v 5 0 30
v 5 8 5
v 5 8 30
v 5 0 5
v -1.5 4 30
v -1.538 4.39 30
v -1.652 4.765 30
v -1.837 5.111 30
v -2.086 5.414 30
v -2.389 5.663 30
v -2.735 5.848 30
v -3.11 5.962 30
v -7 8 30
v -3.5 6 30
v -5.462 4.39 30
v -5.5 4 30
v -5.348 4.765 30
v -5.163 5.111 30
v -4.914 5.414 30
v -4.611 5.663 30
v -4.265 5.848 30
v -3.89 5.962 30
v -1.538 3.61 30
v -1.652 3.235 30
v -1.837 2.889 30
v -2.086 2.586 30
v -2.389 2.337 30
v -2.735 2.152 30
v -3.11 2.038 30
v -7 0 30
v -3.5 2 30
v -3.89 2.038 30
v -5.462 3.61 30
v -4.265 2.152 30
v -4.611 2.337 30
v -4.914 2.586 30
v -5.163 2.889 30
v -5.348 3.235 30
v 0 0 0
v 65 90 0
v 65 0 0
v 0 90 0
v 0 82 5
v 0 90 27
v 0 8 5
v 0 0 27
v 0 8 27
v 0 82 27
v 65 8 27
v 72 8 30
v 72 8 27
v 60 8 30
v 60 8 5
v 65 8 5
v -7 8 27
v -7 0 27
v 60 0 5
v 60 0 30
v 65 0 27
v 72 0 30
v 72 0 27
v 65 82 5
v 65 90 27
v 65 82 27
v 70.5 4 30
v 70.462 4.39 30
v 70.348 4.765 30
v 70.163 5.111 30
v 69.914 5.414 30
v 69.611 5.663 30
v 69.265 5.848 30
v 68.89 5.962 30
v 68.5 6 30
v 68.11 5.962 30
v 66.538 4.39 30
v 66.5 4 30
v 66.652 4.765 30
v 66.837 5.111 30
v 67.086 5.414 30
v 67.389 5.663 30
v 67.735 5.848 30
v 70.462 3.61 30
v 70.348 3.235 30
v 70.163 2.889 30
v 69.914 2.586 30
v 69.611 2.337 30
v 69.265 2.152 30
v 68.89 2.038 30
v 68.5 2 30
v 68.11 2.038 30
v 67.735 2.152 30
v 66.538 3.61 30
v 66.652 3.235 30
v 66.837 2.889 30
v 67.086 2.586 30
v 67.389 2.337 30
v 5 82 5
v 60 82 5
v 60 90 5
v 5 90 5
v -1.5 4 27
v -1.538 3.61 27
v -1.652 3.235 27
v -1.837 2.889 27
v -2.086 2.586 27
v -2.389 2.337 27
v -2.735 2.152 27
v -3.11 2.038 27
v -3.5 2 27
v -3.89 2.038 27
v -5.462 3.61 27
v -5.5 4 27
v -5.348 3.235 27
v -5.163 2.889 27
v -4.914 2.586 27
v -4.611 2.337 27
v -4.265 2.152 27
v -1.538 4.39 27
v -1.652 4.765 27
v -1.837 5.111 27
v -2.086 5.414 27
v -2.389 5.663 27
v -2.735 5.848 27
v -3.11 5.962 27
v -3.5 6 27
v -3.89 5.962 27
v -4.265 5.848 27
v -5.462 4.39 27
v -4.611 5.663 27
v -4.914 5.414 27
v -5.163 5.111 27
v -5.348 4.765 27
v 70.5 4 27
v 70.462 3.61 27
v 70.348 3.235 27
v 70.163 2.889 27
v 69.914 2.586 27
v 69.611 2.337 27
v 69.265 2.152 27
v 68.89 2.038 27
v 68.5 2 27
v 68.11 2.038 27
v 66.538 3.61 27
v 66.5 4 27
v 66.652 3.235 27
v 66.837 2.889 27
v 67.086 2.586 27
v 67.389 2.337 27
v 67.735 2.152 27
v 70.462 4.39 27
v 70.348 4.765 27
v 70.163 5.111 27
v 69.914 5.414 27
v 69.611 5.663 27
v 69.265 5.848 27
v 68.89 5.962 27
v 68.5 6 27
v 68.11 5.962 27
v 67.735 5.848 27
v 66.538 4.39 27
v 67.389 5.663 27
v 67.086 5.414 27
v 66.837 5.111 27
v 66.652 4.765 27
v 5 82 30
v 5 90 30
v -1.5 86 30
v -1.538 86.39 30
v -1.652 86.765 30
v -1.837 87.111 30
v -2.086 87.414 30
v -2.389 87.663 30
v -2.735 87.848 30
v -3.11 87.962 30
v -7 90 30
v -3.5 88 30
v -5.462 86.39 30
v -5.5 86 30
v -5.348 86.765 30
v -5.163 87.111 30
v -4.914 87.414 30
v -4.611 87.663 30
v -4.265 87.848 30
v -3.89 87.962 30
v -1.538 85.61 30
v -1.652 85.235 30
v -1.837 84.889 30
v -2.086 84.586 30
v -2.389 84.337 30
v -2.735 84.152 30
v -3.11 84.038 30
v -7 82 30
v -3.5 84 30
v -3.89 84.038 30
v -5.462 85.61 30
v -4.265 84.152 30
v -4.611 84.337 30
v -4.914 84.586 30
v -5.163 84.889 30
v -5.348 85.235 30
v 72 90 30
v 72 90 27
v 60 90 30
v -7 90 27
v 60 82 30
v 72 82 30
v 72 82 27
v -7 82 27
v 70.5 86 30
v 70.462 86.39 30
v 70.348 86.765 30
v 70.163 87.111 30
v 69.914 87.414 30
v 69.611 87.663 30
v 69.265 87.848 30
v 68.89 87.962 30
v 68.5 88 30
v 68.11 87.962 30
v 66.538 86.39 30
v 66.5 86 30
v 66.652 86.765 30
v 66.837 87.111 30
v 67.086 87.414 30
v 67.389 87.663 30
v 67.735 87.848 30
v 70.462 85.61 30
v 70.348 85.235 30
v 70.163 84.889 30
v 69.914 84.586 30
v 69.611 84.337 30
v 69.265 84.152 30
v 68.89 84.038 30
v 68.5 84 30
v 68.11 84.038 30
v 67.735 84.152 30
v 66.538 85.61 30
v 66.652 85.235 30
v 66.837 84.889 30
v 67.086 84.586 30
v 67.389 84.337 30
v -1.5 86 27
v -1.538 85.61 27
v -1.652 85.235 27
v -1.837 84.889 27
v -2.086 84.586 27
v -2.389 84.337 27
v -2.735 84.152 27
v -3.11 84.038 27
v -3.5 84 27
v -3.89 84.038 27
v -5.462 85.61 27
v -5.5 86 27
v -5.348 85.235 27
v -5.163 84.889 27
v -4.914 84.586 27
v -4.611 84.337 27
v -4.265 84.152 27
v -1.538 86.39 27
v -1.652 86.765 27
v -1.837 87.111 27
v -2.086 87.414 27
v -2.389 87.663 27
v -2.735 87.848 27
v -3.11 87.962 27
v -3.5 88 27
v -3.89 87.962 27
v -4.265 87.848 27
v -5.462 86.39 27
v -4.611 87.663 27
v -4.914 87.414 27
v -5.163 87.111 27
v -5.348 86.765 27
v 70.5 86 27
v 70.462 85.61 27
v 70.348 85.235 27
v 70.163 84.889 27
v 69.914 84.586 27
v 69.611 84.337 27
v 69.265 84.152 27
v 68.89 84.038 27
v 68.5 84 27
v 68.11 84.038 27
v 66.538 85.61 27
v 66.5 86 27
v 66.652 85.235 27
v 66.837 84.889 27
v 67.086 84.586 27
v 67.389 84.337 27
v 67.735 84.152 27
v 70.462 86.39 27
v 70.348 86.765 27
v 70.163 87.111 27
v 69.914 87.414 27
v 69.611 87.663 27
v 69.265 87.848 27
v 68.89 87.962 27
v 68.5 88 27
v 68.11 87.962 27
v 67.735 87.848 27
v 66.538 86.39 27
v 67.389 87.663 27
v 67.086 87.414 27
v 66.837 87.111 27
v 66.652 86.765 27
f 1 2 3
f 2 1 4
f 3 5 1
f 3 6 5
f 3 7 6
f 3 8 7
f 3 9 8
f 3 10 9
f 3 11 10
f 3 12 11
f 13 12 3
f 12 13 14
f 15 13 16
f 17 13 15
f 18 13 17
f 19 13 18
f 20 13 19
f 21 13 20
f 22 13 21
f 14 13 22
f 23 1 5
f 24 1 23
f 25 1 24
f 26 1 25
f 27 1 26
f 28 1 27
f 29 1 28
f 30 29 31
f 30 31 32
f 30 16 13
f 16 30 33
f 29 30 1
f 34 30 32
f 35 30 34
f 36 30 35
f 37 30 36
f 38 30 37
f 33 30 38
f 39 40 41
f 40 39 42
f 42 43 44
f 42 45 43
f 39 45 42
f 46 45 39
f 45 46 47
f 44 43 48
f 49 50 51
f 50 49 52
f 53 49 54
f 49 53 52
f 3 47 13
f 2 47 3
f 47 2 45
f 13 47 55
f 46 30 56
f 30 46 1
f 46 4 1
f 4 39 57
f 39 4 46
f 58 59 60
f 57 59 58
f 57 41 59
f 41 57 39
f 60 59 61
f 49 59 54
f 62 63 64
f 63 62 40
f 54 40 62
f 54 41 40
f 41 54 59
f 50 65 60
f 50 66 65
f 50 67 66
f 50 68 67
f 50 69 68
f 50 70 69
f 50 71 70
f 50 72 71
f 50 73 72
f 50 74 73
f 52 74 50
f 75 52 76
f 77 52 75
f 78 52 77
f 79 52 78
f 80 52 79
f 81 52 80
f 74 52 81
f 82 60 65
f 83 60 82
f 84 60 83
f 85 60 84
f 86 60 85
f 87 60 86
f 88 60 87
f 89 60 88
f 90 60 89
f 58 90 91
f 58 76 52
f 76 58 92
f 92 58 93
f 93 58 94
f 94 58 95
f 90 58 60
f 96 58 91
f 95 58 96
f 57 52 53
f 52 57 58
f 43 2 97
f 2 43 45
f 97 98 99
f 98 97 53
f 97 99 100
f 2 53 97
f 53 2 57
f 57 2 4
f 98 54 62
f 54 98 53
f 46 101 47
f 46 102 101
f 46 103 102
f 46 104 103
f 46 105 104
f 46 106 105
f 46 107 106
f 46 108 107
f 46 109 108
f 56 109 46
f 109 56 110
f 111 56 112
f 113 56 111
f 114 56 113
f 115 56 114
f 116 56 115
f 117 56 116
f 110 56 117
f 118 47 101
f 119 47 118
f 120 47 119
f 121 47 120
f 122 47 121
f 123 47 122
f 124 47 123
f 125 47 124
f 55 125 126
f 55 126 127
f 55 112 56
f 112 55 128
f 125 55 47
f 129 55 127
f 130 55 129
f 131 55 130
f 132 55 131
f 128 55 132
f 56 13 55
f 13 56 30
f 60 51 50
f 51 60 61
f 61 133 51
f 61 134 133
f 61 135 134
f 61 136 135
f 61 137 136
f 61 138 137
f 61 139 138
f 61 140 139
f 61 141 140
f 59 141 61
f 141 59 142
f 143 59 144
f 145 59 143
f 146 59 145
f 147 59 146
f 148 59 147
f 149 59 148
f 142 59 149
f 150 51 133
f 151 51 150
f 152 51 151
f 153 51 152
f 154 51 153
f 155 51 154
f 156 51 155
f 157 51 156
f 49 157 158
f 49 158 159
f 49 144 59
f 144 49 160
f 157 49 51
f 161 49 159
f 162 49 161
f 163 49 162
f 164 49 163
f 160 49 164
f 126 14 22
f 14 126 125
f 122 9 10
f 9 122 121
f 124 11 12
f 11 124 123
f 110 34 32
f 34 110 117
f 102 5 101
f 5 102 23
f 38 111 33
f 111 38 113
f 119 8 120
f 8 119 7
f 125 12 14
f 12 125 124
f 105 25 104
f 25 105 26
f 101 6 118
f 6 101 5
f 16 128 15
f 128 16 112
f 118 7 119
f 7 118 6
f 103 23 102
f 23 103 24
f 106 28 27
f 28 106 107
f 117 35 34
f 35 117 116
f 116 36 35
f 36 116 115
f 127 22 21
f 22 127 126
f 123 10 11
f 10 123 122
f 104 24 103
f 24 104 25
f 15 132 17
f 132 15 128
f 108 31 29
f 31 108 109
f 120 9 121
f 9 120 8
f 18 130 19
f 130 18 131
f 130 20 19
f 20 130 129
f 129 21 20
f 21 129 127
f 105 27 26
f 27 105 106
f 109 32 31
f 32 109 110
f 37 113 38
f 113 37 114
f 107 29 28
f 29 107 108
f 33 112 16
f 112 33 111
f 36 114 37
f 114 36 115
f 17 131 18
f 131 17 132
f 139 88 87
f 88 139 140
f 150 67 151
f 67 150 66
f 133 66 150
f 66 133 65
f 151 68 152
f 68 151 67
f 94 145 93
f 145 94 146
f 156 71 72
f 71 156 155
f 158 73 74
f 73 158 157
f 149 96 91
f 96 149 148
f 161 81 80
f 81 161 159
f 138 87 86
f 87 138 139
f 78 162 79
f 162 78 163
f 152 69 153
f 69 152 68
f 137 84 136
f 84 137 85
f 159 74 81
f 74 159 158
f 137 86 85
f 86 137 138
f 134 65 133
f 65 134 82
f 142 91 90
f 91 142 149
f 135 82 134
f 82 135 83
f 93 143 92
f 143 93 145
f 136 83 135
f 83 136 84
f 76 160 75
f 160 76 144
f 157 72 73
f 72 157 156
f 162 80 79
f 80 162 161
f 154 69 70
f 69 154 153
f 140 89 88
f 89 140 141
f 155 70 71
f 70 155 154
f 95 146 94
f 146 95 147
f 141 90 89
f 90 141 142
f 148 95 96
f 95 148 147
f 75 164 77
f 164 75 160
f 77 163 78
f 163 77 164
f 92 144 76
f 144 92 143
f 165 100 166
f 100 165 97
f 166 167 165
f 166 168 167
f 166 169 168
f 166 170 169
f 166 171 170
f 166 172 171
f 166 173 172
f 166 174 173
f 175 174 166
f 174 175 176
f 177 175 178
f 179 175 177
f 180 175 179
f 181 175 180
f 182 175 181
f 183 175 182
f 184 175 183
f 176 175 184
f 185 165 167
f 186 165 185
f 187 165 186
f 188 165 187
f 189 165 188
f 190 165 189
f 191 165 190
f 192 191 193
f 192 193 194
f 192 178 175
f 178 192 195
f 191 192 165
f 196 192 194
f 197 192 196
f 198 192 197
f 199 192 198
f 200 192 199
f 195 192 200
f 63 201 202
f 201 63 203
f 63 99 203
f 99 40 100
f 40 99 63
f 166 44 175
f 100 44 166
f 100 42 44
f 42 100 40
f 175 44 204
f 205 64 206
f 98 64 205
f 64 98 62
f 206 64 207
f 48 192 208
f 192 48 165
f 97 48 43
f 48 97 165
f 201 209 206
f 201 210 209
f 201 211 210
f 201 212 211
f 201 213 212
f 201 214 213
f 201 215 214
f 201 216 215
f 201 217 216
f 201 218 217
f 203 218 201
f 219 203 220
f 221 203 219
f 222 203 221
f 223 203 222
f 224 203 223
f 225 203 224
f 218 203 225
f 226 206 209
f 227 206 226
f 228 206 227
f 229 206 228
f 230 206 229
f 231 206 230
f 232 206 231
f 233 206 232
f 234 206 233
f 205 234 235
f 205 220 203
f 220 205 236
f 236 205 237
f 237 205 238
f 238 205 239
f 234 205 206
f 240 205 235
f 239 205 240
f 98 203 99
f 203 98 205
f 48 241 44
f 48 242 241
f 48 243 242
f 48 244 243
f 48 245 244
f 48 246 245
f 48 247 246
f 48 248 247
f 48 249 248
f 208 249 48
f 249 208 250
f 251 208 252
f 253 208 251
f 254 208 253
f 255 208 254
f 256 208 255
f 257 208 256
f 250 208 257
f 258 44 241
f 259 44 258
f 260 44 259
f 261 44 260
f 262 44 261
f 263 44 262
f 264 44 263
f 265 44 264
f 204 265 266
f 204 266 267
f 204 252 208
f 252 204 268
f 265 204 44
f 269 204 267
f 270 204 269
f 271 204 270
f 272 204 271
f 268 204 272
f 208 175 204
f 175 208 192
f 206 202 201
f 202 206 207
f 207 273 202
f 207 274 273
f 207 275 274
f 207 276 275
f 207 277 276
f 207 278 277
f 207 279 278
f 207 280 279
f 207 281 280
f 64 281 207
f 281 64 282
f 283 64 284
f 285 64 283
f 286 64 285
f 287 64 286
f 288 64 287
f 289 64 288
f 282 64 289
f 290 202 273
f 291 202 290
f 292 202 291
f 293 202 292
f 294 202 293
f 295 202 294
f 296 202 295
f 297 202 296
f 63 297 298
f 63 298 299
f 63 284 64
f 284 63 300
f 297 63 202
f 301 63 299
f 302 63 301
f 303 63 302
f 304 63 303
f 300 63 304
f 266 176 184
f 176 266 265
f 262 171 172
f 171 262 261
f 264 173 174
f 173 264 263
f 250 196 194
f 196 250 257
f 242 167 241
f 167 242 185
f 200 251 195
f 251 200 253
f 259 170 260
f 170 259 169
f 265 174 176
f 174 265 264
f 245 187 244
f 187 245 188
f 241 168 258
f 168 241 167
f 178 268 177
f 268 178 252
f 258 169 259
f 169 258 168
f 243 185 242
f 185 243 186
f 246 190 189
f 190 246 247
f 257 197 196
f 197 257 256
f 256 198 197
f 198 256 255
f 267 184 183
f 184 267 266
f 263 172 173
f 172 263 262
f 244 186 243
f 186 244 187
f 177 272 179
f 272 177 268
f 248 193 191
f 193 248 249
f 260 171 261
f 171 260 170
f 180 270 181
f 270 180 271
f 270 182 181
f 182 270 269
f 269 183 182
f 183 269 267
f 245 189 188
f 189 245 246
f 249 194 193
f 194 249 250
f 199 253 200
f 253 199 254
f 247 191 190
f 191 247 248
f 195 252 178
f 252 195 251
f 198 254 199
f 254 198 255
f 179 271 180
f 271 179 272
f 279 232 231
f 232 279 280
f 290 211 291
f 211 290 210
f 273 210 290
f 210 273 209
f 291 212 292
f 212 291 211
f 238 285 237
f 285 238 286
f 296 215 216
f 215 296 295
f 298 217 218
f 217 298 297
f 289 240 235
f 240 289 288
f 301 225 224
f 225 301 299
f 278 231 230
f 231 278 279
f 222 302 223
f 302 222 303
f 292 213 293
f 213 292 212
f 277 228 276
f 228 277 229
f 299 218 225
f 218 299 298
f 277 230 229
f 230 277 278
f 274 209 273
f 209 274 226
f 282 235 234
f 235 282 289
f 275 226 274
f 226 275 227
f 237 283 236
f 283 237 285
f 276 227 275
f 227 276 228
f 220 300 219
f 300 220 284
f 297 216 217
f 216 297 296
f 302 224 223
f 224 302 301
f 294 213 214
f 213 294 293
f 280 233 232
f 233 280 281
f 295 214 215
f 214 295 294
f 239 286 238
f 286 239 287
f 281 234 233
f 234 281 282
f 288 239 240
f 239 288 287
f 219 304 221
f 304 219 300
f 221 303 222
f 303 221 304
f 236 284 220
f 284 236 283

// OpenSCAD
// file: config.scad
// Confdiguration for M4 screw

// configuration
space = 4;
hole = 4;
pad = space/2;
thickness = 2;

// multiplier for hole size
hfix = 1.15;
ufix = 1.05;
// main file
include <config.scad>

// Parameters
u_thickness = 5; 
u_height = 25+u_thickness;
arm_distance = 45+u_thickness*2;
u_width = 8;
border_length = 15;
length = 96;

module u_shape_hole(height, thickness, arm_distance, width, border_len, border_thick) {
    $fa = 1;
    $fs = 0.4;
    difference() {
        union() {
            // arms
            cube([thickness, width, height]);
            translate([arm_distance + thickness, 0, 0])
                cube([thickness, width, height]);
            
            // Base connecting the arms
            cube([arm_distance + 2*thickness, width, thickness]);
            
            // borders
            translate([-border_len, 0, height - border_thick])
                cube([border_len + thickness, width, border_thick]);
            translate([arm_distance + thickness, 0, height - border_thick])
                cube([border_len + thickness, width, border_thick]);
        }
        
        // Screw holes
        translate([
            -border_len/2,
            width/2,
            height
        ])
            translate([0, 0, -height/2 - pad])
                cylinder(h=height + 2*pad, r=hole/2);
        translate([
            arm_distance + 2*thickness + border_len/2,
            width/2,
            height
        ])
            translate([0, 0, -height/2 - pad])
                cylinder(h=height + 2*pad, r=hole/2);
    }
}

module batterieHolder(height=25+5, thickness=5, arm_distance=42+5*2, width=8, length=15){
    
    border_len = 7;
    border_thick = 3;
    
    // Front U shape
    u_shape_hole(height, thickness, arm_distance, width, border_len, border_thick);
    
    // Bottom plate connecting front and back
    cube([arm_distance + 2*thickness, length, thickness]);
    
    // Back U shape
    translate([0, length - width, 0])
        u_shape_hole(height, thickness, arm_distance, width, border_len, border_thick);
    
}

batterieHolder(u_height, u_thickness, arm_distance, u_width, 90);
